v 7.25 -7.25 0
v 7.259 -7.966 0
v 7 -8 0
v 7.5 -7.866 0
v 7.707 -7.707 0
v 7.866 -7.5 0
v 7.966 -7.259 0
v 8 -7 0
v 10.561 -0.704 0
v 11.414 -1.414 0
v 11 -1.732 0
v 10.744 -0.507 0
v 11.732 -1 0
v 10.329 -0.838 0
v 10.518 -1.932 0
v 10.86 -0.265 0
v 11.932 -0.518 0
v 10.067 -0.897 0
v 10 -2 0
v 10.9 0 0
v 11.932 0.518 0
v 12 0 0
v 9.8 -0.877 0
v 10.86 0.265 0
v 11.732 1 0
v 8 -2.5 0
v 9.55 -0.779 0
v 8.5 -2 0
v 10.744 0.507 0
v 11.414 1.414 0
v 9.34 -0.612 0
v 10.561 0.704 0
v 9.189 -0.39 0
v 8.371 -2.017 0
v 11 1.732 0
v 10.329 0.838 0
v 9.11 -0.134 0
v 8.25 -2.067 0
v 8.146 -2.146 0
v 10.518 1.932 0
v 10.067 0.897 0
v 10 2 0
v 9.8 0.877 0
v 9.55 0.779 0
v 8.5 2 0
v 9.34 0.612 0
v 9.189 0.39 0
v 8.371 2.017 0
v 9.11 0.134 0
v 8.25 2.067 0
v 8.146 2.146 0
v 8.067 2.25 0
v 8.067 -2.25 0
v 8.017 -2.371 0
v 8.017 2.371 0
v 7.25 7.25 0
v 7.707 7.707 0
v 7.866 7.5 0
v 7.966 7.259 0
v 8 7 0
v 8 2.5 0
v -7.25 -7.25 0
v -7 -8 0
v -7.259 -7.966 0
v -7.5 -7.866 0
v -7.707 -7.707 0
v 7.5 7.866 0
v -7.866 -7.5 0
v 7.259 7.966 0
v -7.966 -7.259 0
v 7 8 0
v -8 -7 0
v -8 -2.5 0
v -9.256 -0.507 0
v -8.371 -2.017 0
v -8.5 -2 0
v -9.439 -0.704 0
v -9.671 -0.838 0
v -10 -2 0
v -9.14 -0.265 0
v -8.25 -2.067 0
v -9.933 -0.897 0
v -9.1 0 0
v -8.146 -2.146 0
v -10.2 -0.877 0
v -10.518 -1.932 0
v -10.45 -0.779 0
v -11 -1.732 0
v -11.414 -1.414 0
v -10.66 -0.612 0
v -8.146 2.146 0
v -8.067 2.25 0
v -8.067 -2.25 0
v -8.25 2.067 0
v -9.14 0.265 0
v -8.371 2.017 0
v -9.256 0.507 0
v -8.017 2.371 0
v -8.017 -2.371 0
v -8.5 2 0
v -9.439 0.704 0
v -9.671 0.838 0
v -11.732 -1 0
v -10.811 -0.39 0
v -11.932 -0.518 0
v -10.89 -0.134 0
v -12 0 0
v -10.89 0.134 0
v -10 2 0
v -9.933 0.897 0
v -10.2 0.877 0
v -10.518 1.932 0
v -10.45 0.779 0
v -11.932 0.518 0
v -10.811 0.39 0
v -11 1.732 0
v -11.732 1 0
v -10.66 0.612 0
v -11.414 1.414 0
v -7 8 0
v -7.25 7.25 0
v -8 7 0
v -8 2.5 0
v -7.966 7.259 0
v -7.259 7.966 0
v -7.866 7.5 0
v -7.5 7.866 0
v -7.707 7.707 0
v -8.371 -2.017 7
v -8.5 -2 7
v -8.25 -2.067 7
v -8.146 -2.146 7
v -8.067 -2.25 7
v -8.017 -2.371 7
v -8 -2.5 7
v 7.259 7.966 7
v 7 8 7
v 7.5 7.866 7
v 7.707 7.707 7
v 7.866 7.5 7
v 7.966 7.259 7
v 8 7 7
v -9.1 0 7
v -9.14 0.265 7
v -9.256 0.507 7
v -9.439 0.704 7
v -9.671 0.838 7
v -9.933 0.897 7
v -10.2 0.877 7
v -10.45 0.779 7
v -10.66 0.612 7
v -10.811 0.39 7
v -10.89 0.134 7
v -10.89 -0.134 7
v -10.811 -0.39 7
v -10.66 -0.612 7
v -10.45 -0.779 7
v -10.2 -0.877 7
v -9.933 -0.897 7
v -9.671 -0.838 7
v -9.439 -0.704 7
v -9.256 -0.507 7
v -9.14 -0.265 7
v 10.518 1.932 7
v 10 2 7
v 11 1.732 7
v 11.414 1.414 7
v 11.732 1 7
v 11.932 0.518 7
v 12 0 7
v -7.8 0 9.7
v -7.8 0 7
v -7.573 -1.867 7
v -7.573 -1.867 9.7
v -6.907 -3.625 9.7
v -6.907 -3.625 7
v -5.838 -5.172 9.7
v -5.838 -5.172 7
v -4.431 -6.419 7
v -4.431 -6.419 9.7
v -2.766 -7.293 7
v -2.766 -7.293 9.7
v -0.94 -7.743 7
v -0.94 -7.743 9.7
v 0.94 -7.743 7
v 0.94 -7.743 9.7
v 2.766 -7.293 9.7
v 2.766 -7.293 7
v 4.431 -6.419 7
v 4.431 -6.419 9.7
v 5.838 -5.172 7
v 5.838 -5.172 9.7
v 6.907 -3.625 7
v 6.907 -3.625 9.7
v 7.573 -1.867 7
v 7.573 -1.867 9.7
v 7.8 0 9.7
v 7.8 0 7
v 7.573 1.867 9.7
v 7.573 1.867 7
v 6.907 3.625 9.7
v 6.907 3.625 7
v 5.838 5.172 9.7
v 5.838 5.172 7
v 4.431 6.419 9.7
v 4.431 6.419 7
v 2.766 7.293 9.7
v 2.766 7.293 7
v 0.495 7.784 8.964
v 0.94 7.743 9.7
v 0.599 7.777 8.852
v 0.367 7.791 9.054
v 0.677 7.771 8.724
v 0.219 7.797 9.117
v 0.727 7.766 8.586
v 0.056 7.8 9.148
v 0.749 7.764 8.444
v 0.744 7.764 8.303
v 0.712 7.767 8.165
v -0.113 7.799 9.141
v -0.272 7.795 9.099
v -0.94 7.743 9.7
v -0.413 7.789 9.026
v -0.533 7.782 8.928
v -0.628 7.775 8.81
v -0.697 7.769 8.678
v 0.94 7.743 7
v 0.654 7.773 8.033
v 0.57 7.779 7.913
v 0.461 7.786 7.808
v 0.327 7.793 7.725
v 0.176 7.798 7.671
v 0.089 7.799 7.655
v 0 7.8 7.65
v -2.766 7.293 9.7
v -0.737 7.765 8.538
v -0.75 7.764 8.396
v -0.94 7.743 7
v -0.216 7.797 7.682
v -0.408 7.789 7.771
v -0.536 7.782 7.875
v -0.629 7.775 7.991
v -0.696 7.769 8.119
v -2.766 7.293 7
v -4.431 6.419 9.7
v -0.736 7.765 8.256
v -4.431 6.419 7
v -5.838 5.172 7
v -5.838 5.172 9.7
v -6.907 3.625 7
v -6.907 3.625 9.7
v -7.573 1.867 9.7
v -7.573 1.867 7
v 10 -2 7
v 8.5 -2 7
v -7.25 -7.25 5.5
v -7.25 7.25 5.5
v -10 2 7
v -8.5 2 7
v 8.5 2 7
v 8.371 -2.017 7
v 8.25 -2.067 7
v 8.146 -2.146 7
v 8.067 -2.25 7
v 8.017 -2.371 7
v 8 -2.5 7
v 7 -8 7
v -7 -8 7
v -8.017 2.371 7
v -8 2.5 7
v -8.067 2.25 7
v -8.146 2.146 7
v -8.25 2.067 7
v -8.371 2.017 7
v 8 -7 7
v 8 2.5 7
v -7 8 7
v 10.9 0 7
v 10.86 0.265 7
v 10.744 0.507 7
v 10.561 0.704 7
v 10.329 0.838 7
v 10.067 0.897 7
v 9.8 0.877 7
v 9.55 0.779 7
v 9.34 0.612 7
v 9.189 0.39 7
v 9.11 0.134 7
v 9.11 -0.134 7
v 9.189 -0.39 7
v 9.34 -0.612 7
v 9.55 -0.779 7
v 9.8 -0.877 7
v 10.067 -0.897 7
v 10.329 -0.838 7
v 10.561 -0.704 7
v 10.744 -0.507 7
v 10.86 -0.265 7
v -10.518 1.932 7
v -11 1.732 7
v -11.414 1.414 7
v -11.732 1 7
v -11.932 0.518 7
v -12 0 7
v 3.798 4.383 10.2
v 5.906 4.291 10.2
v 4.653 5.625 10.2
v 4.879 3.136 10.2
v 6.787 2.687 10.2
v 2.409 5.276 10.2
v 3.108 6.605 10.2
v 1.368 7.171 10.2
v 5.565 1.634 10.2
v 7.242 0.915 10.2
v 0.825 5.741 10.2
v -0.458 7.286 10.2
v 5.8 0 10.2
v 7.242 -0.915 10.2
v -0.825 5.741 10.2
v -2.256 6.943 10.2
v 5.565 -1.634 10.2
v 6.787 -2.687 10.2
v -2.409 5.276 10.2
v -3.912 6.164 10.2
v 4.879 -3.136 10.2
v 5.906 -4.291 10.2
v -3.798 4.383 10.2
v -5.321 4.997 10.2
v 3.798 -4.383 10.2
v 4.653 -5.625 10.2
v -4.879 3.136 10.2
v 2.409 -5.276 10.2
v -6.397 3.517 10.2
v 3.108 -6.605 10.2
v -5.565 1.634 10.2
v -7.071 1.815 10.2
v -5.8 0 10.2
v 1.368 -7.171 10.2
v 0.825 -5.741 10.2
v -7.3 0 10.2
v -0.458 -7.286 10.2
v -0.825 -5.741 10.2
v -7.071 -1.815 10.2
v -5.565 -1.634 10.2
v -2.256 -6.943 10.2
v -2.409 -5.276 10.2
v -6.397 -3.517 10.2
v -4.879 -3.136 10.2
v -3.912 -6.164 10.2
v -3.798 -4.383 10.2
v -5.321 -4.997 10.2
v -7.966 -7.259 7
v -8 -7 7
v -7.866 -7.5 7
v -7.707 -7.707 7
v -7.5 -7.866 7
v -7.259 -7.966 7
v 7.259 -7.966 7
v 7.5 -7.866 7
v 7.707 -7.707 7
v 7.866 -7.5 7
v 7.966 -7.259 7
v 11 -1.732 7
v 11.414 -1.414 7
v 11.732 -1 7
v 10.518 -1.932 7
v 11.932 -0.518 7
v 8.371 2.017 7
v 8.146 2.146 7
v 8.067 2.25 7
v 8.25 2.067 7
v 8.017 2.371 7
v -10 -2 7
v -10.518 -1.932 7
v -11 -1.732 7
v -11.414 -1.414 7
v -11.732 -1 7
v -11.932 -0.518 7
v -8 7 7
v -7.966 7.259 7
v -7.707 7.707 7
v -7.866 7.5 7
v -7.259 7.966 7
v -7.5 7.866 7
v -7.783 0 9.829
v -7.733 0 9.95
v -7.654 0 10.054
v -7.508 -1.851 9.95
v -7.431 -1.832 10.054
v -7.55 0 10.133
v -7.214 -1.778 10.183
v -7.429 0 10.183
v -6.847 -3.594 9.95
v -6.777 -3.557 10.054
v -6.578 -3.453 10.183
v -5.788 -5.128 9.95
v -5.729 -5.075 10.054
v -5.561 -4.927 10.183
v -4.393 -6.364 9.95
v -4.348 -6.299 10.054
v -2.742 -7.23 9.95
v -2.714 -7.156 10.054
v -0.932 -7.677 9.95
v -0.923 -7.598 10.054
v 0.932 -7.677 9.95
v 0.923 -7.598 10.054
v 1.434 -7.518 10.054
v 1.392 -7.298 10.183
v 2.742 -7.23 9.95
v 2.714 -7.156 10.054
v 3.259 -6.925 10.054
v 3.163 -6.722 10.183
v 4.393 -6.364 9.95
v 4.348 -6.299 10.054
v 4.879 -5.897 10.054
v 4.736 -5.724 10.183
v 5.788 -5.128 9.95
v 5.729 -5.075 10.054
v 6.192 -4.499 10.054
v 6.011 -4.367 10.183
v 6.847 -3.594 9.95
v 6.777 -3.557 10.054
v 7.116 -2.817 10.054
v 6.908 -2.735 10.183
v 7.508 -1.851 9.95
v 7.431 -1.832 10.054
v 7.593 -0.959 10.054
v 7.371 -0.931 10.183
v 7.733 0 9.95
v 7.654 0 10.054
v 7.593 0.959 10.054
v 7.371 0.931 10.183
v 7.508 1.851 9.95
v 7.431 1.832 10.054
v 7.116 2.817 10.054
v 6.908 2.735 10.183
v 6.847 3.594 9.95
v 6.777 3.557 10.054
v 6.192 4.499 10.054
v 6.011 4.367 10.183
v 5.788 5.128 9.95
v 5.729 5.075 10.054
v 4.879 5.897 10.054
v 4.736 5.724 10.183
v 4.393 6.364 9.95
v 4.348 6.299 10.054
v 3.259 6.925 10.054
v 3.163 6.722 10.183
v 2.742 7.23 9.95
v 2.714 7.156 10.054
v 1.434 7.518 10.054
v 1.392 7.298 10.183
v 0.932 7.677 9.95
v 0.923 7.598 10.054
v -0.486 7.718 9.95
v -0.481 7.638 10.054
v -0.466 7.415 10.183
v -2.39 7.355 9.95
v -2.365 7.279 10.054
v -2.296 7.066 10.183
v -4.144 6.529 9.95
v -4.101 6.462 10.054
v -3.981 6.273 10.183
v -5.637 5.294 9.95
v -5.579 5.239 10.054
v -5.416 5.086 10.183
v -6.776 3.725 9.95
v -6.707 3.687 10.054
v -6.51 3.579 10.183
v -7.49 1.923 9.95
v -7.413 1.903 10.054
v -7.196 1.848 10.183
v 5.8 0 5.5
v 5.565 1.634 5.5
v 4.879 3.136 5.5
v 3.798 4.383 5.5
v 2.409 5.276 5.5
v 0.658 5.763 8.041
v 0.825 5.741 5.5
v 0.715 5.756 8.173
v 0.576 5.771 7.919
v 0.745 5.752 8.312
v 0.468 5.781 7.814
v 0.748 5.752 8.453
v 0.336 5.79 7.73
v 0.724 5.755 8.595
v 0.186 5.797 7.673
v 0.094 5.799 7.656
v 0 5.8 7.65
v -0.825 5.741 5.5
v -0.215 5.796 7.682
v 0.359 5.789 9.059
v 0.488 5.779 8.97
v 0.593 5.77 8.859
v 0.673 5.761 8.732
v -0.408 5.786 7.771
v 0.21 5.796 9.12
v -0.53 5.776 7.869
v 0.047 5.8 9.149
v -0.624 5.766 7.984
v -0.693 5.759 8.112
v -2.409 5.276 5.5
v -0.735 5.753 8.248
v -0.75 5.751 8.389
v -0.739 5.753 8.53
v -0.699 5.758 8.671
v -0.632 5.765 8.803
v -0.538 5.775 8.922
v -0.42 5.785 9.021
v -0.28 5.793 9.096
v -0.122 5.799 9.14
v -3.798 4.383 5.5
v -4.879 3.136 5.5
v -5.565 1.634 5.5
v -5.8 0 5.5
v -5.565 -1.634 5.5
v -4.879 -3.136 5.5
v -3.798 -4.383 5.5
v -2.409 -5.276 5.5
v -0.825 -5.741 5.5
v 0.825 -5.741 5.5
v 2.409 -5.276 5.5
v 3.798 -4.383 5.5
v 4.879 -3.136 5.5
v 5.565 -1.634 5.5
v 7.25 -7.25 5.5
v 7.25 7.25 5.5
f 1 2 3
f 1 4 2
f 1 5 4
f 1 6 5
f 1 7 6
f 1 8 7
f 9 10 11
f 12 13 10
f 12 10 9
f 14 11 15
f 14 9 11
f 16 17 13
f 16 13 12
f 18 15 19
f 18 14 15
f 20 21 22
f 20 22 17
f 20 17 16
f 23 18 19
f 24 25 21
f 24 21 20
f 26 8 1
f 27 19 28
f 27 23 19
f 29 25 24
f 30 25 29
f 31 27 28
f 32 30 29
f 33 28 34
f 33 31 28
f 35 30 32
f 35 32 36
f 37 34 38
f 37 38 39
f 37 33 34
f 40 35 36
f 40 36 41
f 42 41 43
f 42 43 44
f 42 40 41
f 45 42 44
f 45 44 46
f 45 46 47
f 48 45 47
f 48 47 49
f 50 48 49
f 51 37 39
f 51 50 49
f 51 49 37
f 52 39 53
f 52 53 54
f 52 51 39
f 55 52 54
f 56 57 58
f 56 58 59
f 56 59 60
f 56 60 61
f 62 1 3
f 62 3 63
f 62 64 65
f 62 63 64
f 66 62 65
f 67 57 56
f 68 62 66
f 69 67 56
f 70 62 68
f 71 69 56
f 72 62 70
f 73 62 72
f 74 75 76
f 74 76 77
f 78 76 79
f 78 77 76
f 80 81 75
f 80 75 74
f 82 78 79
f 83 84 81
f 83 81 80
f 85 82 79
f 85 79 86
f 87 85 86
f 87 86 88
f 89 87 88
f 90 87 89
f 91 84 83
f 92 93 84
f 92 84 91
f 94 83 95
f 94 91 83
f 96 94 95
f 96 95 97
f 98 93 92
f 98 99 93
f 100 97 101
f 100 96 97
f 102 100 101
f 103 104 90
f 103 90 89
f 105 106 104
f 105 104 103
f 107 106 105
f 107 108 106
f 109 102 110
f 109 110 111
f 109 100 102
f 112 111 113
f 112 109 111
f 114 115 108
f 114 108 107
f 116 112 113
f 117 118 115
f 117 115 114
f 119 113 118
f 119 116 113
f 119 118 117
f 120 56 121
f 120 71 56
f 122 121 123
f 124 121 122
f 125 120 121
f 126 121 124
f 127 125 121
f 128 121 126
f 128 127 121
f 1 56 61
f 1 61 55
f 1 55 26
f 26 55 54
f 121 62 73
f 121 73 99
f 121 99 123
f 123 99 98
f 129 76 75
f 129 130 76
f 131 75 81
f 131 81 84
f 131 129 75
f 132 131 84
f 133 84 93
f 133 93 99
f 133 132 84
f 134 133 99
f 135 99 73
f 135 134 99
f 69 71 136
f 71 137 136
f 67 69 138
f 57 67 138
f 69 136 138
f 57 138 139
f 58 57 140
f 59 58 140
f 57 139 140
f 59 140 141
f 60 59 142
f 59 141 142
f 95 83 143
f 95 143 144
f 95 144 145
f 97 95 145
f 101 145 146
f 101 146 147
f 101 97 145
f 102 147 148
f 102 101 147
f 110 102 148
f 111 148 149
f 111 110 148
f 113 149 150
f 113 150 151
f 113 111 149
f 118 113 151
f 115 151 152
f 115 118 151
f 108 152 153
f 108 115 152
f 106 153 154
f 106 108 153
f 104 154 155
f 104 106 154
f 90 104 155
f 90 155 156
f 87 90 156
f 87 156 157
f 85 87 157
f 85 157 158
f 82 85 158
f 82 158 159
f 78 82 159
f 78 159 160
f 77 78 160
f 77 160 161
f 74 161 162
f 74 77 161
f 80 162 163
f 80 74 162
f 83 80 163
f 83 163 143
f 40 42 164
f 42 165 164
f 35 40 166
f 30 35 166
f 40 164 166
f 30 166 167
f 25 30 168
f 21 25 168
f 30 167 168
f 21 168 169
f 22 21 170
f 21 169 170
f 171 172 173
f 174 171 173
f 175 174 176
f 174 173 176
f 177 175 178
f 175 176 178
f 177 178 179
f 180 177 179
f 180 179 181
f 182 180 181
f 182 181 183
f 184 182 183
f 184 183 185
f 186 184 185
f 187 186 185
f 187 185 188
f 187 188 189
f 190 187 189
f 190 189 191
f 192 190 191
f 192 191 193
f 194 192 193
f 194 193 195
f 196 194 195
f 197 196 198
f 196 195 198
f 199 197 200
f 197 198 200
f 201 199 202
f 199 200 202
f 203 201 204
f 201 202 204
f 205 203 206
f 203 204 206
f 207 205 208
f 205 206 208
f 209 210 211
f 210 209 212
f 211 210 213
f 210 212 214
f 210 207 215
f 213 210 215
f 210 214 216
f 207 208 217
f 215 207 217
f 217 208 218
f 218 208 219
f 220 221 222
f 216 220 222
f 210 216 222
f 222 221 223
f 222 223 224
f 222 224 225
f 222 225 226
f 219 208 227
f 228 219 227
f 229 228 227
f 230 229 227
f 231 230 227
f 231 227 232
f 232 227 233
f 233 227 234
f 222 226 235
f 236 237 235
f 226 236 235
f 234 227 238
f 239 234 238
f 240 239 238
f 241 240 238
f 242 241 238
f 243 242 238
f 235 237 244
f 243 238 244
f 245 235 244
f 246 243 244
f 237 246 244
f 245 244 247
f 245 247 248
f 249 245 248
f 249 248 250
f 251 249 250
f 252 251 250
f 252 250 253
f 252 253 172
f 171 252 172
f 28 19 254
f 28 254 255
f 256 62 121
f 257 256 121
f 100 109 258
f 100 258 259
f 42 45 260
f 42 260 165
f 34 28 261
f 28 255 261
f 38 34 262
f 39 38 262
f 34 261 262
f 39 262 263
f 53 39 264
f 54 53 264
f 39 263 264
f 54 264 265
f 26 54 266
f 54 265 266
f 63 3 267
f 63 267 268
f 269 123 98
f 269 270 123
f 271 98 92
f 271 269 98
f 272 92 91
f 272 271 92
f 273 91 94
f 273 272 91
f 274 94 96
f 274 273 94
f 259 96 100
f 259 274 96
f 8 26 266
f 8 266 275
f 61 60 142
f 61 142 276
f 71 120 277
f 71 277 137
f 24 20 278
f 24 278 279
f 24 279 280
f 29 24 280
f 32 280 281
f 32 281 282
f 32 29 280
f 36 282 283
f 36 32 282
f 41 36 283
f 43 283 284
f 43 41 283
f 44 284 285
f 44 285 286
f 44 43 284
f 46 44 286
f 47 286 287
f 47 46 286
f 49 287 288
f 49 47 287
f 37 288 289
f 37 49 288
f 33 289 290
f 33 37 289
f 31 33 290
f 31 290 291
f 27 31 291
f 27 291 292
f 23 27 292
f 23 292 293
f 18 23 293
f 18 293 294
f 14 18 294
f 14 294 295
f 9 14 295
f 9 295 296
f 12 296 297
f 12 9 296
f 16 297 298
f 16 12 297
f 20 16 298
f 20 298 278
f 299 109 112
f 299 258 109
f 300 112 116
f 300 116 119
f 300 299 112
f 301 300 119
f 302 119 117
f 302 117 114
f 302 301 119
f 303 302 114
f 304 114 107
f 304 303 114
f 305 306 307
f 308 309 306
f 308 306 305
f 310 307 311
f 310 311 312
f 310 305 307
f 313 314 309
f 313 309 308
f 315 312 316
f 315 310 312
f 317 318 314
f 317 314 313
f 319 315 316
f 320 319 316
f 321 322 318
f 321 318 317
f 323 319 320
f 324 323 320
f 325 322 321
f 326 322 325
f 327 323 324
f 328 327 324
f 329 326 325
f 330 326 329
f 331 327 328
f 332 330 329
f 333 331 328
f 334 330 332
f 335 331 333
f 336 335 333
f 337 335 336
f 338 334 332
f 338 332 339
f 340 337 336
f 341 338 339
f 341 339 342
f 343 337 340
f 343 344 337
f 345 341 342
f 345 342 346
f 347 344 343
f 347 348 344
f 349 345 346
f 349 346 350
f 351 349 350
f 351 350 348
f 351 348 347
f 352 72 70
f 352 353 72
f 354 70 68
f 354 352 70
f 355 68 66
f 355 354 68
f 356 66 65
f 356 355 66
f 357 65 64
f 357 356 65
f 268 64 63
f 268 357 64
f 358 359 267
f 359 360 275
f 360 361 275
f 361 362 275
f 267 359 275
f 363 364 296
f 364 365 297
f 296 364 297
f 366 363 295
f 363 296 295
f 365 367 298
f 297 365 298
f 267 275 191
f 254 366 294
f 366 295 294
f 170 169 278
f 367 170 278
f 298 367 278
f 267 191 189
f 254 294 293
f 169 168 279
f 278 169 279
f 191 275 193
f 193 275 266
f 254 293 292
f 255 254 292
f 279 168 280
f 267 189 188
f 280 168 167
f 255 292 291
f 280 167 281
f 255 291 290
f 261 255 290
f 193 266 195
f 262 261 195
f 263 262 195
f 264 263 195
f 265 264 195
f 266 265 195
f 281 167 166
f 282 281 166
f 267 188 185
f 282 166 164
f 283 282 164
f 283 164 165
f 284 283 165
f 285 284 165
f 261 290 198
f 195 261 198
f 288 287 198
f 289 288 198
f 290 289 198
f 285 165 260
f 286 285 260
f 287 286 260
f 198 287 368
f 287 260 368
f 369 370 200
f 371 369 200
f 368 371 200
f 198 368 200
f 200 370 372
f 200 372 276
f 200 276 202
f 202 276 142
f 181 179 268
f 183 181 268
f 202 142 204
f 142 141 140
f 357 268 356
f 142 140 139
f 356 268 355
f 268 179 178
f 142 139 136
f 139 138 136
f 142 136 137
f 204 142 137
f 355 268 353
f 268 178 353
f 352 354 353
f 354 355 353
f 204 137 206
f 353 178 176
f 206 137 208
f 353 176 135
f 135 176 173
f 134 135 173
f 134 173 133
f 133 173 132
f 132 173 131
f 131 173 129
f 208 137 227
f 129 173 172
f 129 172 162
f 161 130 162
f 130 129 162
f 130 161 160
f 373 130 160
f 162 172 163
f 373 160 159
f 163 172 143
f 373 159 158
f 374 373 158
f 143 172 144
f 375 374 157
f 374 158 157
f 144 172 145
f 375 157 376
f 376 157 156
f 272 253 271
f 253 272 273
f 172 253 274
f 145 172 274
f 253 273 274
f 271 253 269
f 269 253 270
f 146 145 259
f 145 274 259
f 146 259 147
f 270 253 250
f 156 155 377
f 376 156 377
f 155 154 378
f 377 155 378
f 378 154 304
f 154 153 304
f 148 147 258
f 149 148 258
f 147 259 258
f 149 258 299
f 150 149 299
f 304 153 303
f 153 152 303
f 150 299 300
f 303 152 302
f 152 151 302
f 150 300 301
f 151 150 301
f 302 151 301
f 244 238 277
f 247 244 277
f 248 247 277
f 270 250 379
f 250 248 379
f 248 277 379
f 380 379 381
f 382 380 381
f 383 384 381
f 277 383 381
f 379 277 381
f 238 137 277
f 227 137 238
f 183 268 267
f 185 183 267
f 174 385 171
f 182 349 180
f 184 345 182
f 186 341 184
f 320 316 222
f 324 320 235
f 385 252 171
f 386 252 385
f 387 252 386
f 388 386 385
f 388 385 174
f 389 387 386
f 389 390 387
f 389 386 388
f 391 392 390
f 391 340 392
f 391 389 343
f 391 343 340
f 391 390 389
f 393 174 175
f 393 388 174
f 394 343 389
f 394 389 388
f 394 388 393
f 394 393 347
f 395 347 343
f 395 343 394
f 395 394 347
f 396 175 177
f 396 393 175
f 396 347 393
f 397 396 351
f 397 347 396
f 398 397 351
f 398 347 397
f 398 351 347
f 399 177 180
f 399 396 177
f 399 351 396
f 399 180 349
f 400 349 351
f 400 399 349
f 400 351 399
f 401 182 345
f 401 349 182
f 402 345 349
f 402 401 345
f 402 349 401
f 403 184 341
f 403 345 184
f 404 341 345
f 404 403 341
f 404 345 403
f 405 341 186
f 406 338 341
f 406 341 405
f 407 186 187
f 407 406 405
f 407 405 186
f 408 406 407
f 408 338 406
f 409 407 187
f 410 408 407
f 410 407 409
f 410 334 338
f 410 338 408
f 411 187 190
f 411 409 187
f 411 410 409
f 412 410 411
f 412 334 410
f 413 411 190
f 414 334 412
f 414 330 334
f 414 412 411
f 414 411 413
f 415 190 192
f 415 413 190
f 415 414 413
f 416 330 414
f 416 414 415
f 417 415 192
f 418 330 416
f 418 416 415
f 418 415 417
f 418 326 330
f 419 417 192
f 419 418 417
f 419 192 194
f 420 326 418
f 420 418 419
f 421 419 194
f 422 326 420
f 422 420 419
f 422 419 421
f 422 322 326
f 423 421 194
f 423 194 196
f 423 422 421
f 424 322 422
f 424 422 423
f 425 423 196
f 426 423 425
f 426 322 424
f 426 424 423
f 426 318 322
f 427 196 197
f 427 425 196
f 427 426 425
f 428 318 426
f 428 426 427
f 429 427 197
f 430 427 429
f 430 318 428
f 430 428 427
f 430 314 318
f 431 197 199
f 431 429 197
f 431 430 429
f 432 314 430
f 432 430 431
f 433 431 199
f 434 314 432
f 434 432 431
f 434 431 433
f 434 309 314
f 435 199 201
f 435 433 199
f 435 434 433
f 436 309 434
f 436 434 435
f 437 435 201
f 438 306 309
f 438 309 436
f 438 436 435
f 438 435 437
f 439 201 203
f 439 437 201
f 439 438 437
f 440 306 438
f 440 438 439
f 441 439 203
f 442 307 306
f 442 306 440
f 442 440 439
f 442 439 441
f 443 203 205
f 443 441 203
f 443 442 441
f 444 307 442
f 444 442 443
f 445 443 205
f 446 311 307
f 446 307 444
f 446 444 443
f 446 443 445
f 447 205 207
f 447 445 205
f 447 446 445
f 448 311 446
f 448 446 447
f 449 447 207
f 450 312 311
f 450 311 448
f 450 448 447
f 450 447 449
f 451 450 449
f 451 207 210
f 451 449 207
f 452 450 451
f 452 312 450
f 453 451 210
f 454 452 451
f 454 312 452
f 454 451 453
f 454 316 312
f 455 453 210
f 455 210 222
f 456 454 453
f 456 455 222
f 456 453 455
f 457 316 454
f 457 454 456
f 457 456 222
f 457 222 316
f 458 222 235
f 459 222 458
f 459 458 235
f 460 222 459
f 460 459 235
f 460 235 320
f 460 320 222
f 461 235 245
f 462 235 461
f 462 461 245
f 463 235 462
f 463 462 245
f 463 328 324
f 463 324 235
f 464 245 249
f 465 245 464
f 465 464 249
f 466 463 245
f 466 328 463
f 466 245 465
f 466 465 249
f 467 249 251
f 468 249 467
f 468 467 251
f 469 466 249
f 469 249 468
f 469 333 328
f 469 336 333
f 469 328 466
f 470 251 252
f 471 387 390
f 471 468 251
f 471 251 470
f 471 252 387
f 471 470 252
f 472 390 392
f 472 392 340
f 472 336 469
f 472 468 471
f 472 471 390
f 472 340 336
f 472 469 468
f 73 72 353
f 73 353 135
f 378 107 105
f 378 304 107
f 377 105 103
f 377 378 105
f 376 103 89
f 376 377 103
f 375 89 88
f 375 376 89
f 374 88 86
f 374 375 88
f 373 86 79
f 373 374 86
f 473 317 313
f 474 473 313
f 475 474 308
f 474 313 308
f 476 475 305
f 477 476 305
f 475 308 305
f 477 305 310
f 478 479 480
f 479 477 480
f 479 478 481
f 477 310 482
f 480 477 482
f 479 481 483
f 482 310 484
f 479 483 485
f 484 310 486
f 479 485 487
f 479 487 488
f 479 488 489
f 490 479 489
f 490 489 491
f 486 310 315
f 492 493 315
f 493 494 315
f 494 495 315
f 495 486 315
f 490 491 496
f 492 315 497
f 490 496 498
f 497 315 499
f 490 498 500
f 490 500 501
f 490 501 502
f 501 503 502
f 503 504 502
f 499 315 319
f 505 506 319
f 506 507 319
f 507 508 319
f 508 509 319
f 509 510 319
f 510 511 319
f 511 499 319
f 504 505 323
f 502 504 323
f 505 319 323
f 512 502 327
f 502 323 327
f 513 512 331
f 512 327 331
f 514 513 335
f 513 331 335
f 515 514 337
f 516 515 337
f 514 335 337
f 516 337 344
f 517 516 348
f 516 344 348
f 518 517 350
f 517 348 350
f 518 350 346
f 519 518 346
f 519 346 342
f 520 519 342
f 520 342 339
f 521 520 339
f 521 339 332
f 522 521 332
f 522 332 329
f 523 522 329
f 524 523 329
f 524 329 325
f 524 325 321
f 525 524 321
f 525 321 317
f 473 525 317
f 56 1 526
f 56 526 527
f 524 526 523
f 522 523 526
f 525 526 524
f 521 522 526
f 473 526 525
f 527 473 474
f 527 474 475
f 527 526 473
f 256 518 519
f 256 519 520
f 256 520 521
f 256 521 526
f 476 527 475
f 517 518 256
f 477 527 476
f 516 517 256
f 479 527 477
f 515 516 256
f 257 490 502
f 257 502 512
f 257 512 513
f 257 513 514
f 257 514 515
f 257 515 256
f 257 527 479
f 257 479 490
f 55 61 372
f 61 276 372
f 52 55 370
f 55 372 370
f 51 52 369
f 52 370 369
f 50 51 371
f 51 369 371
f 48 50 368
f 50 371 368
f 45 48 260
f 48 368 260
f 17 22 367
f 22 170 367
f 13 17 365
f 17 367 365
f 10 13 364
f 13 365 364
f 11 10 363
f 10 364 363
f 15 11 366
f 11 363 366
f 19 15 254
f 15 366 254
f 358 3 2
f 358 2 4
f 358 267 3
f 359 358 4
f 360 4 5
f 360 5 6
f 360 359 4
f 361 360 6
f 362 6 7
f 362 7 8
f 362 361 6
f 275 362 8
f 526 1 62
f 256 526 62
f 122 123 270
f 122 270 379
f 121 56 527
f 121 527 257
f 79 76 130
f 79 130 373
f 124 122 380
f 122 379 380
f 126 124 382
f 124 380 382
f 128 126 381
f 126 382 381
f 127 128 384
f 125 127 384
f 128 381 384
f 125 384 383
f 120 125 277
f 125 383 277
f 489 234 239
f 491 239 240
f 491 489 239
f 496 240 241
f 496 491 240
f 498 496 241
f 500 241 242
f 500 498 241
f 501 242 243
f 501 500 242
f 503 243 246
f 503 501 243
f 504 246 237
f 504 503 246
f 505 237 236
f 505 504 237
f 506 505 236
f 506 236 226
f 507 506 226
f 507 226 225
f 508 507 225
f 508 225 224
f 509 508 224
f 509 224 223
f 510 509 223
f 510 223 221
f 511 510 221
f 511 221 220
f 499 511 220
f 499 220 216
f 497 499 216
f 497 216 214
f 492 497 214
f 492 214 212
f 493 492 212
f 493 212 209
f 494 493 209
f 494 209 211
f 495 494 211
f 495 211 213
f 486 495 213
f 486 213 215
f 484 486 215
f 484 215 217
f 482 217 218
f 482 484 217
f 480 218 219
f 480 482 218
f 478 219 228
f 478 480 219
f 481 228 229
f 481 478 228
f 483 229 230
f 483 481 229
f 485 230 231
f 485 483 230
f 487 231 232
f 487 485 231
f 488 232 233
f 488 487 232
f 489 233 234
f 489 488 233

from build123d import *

# Parameters (mm, degrees)
SKETCH1_R           = 0.9
BOSS_EXTRUDE1_DEPTH = 7
FILLET1_R           = 2
FILLET2_R           = 1
FILLET3_R           = 0.5
SKETCH2_W           = 14.5
SKETCH2_H           = 14.5
CUT_EXTRUDE1_DEPTH  = 5.5
SKETCH3_R           = 7.8
BOSS_EXTRUDE2_DEPTH = 3.2
SKETCH5_R           = 0.75
CUT_EXTRUDE2_DEPTH  = 18.664653973
FILLET4_R           = 0.5
SKETCH6_R           = 5.8
CUT_EXTRUDE3_DEPTH  = 18.664653973


with BuildPart() as part:
    # Sketch1 → Boss-Extrude1 (new body)
    with BuildSketch(Plane.XY):
        Polygon((-8, 2), (-8, 8), (8, 8), (8, 2), (12, 2), (12, -2), (8, -2), (8, -8), (-8, -8), (-8, -2), (-12, -2), (-12, 2), align=None)
        with Locations((10, 0)):
            Circle(SKETCH1_R, mode=Mode.SUBTRACT)
        with Locations((-10, 0)):
            Circle(SKETCH1_R, mode=Mode.SUBTRACT)
    extrude(amount=BOSS_EXTRUDE1_DEPTH)

    # Fillet1
    fillet1_edges = [part.edges().sort_by_distance(p)[0] for p in [
        (-12, -2, 3.5),
        (-12, 2, 3.5),
        (12, -2, 3.5),
        (12, 2, 3.5),
    ]]
    fillet(fillet1_edges, radius=FILLET1_R - 0.0001)  # a hair under: the kernel refuses the full size

    # Fillet2
    fillet2_edges = [part.edges().sort_by_distance(p)[0] for p in [
        (8, -8, 3.5),
        (-8, -8, 3.5),
        (-8, 8, 3.5),
        (8, 8, 3.5),
    ]]
    fillet(fillet2_edges, radius=FILLET2_R)

    # Fillet3
    fillet3_edges = [part.edges().sort_by_distance(p)[0] for p in [
        (8, 2, 3.5),
        (8, -2, 3.5),
        (-8, -2, 3.5),
        (-8, 2, 3.5),
    ]]
    fillet(fillet3_edges, radius=FILLET3_R)

    # Sketch2 → Cut-Extrude1 (cut)
    with BuildSketch(Plane(origin=(0, 0, 0), x_dir=(-1, 0, 0), z_dir=(0, 0, -1))):
        Rectangle(SKETCH2_W, SKETCH2_H)
    extrude(amount=-CUT_EXTRUDE1_DEPTH, mode=Mode.SUBTRACT)

    # Sketch3 → Boss-Extrude2 (add)
    with BuildSketch(Plane.XY.offset(7)):
        with Locations(Location((0, 0, 0), (0, 0, 180))):
            Circle(SKETCH3_R)
    extrude(amount=BOSS_EXTRUDE2_DEPTH)

    # Sketch5 → Cut-Extrude2 (cut, through all)
    with BuildSketch(Plane(origin=(0, 0, 0), x_dir=(1, 0, 0), z_dir=(0, 1, 0))):
        with Locations(Location((0, -8.4, 0), (0, 0, 90))):
            Circle(SKETCH5_R)
    extrude(amount=CUT_EXTRUDE2_DEPTH, mode=Mode.SUBTRACT)

    # Fillet4
    fillet4_edges = [part.edges().sort_by_distance(p)[0] for p in [
        (7.8, 0, 10.2),
    ]]
    fillet(fillet4_edges, radius=FILLET4_R)

    # Sketch6 → Cut-Extrude3 (cut, through all)
    with BuildSketch(Plane.XY.offset(10.2)):
        Circle(SKETCH6_R)
    extrude(amount=-CUT_EXTRUDE3_DEPTH, mode=Mode.SUBTRACT)


solid = part.part
